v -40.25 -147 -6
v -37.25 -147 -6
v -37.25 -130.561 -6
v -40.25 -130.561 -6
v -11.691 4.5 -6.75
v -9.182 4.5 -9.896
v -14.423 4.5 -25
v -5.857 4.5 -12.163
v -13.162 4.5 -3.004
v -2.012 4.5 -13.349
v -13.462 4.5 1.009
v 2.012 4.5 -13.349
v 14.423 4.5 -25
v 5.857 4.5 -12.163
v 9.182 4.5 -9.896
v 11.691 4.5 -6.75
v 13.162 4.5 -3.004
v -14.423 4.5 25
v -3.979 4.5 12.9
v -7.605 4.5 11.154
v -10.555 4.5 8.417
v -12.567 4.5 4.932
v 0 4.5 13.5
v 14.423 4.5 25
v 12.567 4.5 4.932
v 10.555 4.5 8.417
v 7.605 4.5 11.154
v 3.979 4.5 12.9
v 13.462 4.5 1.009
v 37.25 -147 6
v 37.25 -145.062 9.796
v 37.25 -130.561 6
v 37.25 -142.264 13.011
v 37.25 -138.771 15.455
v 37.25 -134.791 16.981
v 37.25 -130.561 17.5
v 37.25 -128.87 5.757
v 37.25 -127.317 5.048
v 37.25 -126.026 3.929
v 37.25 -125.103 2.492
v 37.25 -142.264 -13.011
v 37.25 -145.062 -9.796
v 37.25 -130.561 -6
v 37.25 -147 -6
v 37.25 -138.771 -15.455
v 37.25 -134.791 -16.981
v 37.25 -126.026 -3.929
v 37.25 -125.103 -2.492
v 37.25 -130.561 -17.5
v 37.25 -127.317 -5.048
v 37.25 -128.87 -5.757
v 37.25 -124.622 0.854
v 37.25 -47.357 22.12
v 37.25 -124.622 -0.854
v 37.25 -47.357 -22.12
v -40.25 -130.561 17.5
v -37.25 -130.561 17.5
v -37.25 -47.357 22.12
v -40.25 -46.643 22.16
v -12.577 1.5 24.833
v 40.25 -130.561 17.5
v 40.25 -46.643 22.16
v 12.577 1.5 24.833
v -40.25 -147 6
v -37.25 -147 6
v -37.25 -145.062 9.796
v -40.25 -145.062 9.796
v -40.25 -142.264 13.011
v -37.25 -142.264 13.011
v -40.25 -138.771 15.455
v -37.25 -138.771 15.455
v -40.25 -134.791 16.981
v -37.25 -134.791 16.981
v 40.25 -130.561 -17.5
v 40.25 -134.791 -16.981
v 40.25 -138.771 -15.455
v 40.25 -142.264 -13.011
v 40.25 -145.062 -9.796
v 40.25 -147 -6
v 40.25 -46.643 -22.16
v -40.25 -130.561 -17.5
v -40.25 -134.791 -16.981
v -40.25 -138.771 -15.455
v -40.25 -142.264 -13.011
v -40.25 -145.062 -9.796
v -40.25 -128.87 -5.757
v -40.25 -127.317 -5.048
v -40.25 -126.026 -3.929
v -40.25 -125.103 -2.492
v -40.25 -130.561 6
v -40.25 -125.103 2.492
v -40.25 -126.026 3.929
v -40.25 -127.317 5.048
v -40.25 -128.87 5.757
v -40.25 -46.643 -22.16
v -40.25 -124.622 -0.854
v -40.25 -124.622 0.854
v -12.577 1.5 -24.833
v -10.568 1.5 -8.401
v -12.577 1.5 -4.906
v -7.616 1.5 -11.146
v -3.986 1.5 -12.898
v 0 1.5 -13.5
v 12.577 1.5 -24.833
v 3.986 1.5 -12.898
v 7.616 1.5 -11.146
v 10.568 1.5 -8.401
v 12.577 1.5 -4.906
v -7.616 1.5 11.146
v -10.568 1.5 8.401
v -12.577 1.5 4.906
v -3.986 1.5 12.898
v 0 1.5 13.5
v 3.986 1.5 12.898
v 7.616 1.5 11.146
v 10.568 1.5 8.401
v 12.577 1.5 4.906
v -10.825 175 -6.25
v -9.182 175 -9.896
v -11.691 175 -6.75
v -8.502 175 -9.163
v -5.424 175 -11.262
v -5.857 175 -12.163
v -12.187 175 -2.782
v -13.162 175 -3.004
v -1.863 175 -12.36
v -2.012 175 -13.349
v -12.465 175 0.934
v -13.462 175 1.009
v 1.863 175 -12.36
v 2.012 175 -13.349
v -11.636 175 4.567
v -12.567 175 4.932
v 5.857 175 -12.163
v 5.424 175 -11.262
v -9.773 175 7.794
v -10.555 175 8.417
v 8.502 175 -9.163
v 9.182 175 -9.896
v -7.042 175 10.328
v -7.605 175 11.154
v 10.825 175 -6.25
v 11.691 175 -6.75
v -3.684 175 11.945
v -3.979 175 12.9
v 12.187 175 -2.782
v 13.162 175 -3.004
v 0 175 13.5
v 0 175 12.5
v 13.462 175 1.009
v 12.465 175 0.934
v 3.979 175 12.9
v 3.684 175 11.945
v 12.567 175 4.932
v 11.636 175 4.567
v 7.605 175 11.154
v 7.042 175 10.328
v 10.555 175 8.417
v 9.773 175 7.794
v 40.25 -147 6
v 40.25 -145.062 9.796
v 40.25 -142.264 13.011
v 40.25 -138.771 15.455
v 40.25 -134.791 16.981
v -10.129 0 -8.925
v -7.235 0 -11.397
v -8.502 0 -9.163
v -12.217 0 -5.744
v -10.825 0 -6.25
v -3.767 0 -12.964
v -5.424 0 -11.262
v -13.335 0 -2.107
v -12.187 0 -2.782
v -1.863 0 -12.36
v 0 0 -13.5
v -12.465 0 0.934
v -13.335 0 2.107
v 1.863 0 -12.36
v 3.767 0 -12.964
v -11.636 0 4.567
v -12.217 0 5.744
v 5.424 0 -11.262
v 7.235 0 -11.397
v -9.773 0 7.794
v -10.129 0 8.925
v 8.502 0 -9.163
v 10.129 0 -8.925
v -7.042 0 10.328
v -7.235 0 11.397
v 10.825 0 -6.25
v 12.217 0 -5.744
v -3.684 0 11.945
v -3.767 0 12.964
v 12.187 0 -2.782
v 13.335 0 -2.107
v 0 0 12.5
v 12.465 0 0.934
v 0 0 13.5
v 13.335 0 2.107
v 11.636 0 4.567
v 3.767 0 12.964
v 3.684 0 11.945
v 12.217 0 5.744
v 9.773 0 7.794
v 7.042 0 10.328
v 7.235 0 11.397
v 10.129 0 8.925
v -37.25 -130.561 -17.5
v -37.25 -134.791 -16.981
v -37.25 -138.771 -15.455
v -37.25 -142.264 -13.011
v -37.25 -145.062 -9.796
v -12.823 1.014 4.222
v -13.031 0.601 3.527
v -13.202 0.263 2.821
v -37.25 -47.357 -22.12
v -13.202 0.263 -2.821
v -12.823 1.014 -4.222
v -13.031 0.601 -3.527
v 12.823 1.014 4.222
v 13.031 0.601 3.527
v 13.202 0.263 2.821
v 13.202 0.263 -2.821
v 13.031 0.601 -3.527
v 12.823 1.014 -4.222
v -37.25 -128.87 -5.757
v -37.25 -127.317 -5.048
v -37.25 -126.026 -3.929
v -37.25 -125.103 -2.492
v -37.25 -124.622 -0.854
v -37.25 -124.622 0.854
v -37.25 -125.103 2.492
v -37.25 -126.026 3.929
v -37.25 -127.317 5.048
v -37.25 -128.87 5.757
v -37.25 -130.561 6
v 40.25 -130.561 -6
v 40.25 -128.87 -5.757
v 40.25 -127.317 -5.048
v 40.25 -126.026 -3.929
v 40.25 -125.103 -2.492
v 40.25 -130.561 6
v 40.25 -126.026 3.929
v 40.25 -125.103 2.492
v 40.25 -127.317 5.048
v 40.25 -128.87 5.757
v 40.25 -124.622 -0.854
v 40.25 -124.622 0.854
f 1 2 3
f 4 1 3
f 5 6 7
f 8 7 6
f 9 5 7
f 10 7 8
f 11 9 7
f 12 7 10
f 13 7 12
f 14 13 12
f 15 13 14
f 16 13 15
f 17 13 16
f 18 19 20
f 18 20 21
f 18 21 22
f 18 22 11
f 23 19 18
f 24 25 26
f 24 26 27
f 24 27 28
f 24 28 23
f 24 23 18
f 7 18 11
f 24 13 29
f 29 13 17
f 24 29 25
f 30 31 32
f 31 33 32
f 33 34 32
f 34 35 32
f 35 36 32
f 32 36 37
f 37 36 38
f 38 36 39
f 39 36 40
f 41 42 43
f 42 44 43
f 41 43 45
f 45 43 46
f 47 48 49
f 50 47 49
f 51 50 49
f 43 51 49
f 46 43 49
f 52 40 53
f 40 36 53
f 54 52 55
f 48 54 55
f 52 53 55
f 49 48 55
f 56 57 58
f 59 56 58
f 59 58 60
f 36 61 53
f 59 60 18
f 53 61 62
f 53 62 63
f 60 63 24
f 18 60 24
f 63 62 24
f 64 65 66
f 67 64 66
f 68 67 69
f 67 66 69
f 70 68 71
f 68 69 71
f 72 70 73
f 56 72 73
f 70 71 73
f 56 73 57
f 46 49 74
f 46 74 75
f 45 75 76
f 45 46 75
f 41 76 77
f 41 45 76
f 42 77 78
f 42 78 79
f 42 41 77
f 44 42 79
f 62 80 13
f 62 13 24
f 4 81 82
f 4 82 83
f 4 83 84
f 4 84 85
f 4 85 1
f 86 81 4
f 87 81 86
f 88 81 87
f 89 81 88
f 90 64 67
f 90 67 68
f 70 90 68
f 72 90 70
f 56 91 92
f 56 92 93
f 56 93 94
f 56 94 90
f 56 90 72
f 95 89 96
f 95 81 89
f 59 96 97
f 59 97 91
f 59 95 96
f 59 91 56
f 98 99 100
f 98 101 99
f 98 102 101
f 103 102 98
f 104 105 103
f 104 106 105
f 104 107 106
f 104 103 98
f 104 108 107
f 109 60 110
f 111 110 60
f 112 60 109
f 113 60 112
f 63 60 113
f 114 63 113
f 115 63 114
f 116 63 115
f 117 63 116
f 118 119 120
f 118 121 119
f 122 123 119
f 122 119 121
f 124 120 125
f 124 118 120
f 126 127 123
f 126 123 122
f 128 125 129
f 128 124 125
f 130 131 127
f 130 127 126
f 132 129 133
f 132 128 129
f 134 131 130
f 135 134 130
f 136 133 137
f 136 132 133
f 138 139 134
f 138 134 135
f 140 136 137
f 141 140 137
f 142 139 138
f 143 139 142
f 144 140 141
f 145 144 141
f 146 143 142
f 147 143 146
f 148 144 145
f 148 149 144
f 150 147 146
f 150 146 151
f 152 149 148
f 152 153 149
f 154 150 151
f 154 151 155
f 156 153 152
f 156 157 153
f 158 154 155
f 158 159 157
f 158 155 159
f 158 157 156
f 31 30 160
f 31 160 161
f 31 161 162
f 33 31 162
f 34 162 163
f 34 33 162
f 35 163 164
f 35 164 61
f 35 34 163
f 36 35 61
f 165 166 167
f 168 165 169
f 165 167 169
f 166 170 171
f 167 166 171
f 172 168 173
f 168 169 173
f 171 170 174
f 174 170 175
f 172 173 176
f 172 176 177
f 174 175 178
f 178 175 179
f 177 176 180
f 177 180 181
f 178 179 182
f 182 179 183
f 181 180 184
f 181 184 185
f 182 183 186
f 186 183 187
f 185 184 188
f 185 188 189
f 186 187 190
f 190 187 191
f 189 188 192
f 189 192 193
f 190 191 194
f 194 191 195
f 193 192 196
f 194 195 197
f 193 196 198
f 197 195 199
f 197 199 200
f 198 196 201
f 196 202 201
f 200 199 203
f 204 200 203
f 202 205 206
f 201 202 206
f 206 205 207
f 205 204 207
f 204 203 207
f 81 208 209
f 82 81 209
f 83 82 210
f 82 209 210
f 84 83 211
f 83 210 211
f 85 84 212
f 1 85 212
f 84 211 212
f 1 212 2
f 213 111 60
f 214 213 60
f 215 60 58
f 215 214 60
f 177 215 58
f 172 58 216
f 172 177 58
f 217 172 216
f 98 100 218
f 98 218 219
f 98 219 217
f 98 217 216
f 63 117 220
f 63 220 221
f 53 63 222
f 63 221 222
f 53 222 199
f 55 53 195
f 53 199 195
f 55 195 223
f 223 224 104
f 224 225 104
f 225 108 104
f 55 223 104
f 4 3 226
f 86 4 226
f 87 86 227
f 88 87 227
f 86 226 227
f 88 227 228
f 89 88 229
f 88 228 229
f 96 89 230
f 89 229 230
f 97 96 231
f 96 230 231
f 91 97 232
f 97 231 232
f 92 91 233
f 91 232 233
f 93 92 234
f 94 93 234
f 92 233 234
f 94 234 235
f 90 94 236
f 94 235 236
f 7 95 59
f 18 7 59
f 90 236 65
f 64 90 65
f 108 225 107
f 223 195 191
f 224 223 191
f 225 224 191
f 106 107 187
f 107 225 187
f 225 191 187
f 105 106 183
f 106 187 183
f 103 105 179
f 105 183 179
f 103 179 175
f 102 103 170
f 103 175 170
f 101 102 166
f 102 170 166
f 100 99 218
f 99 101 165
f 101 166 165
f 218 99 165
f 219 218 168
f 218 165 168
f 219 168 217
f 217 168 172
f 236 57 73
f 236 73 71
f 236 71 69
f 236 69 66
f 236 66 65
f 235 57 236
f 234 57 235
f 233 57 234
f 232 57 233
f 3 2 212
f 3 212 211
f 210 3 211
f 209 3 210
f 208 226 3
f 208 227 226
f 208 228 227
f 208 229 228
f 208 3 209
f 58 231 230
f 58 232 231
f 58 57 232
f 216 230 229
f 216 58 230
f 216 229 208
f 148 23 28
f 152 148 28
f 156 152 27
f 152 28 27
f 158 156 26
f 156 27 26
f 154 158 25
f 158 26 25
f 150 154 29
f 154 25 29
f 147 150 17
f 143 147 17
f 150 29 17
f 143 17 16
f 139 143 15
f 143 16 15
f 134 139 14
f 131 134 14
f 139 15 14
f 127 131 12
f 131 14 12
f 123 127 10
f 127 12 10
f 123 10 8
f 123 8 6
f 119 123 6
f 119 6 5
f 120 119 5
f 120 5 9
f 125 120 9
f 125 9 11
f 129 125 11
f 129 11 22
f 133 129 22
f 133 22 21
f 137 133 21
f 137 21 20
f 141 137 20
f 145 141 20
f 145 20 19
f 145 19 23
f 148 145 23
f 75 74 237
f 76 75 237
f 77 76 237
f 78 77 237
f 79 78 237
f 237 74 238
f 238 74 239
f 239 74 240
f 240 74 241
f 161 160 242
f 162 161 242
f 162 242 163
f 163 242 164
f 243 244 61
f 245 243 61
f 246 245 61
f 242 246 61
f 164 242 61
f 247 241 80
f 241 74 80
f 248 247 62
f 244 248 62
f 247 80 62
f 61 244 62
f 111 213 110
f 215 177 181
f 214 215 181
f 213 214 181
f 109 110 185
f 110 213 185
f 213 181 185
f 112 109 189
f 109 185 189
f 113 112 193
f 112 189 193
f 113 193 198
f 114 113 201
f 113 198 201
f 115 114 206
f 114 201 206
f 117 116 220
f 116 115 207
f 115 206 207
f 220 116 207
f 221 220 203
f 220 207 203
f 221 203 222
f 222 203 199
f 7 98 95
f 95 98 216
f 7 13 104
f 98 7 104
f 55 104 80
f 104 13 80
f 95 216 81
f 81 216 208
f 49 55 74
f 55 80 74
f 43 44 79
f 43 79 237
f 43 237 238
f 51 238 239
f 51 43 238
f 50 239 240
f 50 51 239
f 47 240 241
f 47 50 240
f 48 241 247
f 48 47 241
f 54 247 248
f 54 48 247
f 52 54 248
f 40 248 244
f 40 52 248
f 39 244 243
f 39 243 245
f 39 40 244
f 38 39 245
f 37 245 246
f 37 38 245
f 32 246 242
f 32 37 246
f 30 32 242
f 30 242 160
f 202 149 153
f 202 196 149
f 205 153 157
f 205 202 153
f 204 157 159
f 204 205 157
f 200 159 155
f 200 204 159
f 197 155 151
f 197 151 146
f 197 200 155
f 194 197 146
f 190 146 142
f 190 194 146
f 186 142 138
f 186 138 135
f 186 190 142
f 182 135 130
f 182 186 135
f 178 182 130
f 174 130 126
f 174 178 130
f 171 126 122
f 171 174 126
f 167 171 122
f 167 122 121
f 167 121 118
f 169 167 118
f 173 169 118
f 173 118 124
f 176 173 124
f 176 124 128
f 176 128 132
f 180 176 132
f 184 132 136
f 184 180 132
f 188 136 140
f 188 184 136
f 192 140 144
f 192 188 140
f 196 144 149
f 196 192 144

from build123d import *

# Parameters (mm, degrees)
SKETCH1_R           = 13.5
SKETCH1_R_2         = 12.5
BOSS_EXTRUDE1_DEPTH = 175
SKETCH3_W           = 50
SKETCH3_H           = 3
CUT_EXTRUDE1_START  = -40.25
CUT_EXTRUDE1_DEPTH  = 40.25
CUT_EXTRUDE2_REACH  = 181.854
SKETCH5_R           = 12.5


# Read off the part's stored shape, not the designer's step: Cut-Extrude1
with BuildPart() as part:
    # Sketch1 → Boss-Extrude1 (new body)
    with BuildSketch(Plane(origin=(0, 0, 0), x_dir=(1, 0, 0), z_dir=(0, 1, 0))):
        with Locations(Location((0, 0, 0), (0, 0, 270))):
            Circle(SKETCH1_R)
        with Locations(Location((0, 0, 0), (0, 0, 270))):
            Circle(SKETCH1_R_2, mode=Mode.SUBTRACT)
    extrude(amount=BOSS_EXTRUDE1_DEPTH)

    # Sweep1: sweep along a path in Sketch2
    with BuildLine(Plane.XY) as sweep1_path:
        Line((38.75, -147), (38.75, -47))
        Line((38.75, -47), (13.5, 3))
        Line((13.5, 3), (0, 3))
    # Sketch3 → Sweep1 (sweep)
    with BuildSketch(Plane(origin=(0, 0, 0), x_dir=(0, 0, -1), z_dir=(1, 0, 0))):
        with Locations((0, 3)):
            Rectangle(SKETCH3_W, SKETCH3_H)
    sweep1 = sweep(path=sweep1_path.line, transition=Transition.RIGHT)

    # Cut-Extrude1 outline → Cut-Extrude1 (cut)
    with BuildSketch(Plane(origin=(40.25, 0, 0), x_dir=(0, 0, -1), z_dir=(1, 0, 0)).offset(CUT_EXTRUDE1_START)):
        with BuildLine():
            Line((25, -147), (25, 4.5))
            Line((25, 4.5), (17.5, -130.560717777))
            ThreePointArc((17.5, -130.560717777), (14.3396304, -140.591919101), (6, -147))
            Line((6, -147), (25, -147))
        make_face()
        with BuildLine():
            Line((-25, -147), (-6, -147))
            ThreePointArc((-6, -147), (-14.3396304, -140.591919101), (-17.5, -130.560717777))
            Line((-17.5, -130.560717777), (-25, 4.5))
            Line((-25, 4.5), (-25, -147))
        make_face()
        with BuildLine():
            Line((-6, -147), (6, -147))
            Line((6, -147), (6, -130.560717777))
            ThreePointArc((6, -130.560717777), (0, -124.560717777), (-6, -130.560717777))
            Line((-6, -130.560717777), (-6, -147))
        make_face()
    cut_extrude1 = extrude(amount=CUT_EXTRUDE1_DEPTH, mode=Mode.SUBTRACT)

    # Mirror1: Sweep1, Cut-Extrude1 across plane
    add(sweep1.mirror(Plane(origin=(0, 0, 0), x_dir=(0, 0, 1), z_dir=(1, 0, 0))))
    add(cut_extrude1.mirror(Plane(origin=(0, 0, 0), x_dir=(0, 0, 1), z_dir=(1, 0, 0))), mode=Mode.SUBTRACT)

    # Sketch5 → Cut-Extrude2 (cut, up to next)
    with BuildSketch(Plane.XZ.offset(-1.5), mode=Mode.PRIVATE) as cut_extrude2_sk1:
        with Locations(Location((0, 0, 0), (0, 0, 90))):
            Circle(SKETCH5_R)
    cut_extrude2_tool1 = extrude(cut_extrude2_sk1.sketch, amount=-CUT_EXTRUDE2_REACH, mode=Mode.PRIVATE) & part.part
    add(cut_extrude2_tool1.solids().sort_by_distance((0, 1.5, 0))[0], mode=Mode.SUBTRACT)


solid = part.part
